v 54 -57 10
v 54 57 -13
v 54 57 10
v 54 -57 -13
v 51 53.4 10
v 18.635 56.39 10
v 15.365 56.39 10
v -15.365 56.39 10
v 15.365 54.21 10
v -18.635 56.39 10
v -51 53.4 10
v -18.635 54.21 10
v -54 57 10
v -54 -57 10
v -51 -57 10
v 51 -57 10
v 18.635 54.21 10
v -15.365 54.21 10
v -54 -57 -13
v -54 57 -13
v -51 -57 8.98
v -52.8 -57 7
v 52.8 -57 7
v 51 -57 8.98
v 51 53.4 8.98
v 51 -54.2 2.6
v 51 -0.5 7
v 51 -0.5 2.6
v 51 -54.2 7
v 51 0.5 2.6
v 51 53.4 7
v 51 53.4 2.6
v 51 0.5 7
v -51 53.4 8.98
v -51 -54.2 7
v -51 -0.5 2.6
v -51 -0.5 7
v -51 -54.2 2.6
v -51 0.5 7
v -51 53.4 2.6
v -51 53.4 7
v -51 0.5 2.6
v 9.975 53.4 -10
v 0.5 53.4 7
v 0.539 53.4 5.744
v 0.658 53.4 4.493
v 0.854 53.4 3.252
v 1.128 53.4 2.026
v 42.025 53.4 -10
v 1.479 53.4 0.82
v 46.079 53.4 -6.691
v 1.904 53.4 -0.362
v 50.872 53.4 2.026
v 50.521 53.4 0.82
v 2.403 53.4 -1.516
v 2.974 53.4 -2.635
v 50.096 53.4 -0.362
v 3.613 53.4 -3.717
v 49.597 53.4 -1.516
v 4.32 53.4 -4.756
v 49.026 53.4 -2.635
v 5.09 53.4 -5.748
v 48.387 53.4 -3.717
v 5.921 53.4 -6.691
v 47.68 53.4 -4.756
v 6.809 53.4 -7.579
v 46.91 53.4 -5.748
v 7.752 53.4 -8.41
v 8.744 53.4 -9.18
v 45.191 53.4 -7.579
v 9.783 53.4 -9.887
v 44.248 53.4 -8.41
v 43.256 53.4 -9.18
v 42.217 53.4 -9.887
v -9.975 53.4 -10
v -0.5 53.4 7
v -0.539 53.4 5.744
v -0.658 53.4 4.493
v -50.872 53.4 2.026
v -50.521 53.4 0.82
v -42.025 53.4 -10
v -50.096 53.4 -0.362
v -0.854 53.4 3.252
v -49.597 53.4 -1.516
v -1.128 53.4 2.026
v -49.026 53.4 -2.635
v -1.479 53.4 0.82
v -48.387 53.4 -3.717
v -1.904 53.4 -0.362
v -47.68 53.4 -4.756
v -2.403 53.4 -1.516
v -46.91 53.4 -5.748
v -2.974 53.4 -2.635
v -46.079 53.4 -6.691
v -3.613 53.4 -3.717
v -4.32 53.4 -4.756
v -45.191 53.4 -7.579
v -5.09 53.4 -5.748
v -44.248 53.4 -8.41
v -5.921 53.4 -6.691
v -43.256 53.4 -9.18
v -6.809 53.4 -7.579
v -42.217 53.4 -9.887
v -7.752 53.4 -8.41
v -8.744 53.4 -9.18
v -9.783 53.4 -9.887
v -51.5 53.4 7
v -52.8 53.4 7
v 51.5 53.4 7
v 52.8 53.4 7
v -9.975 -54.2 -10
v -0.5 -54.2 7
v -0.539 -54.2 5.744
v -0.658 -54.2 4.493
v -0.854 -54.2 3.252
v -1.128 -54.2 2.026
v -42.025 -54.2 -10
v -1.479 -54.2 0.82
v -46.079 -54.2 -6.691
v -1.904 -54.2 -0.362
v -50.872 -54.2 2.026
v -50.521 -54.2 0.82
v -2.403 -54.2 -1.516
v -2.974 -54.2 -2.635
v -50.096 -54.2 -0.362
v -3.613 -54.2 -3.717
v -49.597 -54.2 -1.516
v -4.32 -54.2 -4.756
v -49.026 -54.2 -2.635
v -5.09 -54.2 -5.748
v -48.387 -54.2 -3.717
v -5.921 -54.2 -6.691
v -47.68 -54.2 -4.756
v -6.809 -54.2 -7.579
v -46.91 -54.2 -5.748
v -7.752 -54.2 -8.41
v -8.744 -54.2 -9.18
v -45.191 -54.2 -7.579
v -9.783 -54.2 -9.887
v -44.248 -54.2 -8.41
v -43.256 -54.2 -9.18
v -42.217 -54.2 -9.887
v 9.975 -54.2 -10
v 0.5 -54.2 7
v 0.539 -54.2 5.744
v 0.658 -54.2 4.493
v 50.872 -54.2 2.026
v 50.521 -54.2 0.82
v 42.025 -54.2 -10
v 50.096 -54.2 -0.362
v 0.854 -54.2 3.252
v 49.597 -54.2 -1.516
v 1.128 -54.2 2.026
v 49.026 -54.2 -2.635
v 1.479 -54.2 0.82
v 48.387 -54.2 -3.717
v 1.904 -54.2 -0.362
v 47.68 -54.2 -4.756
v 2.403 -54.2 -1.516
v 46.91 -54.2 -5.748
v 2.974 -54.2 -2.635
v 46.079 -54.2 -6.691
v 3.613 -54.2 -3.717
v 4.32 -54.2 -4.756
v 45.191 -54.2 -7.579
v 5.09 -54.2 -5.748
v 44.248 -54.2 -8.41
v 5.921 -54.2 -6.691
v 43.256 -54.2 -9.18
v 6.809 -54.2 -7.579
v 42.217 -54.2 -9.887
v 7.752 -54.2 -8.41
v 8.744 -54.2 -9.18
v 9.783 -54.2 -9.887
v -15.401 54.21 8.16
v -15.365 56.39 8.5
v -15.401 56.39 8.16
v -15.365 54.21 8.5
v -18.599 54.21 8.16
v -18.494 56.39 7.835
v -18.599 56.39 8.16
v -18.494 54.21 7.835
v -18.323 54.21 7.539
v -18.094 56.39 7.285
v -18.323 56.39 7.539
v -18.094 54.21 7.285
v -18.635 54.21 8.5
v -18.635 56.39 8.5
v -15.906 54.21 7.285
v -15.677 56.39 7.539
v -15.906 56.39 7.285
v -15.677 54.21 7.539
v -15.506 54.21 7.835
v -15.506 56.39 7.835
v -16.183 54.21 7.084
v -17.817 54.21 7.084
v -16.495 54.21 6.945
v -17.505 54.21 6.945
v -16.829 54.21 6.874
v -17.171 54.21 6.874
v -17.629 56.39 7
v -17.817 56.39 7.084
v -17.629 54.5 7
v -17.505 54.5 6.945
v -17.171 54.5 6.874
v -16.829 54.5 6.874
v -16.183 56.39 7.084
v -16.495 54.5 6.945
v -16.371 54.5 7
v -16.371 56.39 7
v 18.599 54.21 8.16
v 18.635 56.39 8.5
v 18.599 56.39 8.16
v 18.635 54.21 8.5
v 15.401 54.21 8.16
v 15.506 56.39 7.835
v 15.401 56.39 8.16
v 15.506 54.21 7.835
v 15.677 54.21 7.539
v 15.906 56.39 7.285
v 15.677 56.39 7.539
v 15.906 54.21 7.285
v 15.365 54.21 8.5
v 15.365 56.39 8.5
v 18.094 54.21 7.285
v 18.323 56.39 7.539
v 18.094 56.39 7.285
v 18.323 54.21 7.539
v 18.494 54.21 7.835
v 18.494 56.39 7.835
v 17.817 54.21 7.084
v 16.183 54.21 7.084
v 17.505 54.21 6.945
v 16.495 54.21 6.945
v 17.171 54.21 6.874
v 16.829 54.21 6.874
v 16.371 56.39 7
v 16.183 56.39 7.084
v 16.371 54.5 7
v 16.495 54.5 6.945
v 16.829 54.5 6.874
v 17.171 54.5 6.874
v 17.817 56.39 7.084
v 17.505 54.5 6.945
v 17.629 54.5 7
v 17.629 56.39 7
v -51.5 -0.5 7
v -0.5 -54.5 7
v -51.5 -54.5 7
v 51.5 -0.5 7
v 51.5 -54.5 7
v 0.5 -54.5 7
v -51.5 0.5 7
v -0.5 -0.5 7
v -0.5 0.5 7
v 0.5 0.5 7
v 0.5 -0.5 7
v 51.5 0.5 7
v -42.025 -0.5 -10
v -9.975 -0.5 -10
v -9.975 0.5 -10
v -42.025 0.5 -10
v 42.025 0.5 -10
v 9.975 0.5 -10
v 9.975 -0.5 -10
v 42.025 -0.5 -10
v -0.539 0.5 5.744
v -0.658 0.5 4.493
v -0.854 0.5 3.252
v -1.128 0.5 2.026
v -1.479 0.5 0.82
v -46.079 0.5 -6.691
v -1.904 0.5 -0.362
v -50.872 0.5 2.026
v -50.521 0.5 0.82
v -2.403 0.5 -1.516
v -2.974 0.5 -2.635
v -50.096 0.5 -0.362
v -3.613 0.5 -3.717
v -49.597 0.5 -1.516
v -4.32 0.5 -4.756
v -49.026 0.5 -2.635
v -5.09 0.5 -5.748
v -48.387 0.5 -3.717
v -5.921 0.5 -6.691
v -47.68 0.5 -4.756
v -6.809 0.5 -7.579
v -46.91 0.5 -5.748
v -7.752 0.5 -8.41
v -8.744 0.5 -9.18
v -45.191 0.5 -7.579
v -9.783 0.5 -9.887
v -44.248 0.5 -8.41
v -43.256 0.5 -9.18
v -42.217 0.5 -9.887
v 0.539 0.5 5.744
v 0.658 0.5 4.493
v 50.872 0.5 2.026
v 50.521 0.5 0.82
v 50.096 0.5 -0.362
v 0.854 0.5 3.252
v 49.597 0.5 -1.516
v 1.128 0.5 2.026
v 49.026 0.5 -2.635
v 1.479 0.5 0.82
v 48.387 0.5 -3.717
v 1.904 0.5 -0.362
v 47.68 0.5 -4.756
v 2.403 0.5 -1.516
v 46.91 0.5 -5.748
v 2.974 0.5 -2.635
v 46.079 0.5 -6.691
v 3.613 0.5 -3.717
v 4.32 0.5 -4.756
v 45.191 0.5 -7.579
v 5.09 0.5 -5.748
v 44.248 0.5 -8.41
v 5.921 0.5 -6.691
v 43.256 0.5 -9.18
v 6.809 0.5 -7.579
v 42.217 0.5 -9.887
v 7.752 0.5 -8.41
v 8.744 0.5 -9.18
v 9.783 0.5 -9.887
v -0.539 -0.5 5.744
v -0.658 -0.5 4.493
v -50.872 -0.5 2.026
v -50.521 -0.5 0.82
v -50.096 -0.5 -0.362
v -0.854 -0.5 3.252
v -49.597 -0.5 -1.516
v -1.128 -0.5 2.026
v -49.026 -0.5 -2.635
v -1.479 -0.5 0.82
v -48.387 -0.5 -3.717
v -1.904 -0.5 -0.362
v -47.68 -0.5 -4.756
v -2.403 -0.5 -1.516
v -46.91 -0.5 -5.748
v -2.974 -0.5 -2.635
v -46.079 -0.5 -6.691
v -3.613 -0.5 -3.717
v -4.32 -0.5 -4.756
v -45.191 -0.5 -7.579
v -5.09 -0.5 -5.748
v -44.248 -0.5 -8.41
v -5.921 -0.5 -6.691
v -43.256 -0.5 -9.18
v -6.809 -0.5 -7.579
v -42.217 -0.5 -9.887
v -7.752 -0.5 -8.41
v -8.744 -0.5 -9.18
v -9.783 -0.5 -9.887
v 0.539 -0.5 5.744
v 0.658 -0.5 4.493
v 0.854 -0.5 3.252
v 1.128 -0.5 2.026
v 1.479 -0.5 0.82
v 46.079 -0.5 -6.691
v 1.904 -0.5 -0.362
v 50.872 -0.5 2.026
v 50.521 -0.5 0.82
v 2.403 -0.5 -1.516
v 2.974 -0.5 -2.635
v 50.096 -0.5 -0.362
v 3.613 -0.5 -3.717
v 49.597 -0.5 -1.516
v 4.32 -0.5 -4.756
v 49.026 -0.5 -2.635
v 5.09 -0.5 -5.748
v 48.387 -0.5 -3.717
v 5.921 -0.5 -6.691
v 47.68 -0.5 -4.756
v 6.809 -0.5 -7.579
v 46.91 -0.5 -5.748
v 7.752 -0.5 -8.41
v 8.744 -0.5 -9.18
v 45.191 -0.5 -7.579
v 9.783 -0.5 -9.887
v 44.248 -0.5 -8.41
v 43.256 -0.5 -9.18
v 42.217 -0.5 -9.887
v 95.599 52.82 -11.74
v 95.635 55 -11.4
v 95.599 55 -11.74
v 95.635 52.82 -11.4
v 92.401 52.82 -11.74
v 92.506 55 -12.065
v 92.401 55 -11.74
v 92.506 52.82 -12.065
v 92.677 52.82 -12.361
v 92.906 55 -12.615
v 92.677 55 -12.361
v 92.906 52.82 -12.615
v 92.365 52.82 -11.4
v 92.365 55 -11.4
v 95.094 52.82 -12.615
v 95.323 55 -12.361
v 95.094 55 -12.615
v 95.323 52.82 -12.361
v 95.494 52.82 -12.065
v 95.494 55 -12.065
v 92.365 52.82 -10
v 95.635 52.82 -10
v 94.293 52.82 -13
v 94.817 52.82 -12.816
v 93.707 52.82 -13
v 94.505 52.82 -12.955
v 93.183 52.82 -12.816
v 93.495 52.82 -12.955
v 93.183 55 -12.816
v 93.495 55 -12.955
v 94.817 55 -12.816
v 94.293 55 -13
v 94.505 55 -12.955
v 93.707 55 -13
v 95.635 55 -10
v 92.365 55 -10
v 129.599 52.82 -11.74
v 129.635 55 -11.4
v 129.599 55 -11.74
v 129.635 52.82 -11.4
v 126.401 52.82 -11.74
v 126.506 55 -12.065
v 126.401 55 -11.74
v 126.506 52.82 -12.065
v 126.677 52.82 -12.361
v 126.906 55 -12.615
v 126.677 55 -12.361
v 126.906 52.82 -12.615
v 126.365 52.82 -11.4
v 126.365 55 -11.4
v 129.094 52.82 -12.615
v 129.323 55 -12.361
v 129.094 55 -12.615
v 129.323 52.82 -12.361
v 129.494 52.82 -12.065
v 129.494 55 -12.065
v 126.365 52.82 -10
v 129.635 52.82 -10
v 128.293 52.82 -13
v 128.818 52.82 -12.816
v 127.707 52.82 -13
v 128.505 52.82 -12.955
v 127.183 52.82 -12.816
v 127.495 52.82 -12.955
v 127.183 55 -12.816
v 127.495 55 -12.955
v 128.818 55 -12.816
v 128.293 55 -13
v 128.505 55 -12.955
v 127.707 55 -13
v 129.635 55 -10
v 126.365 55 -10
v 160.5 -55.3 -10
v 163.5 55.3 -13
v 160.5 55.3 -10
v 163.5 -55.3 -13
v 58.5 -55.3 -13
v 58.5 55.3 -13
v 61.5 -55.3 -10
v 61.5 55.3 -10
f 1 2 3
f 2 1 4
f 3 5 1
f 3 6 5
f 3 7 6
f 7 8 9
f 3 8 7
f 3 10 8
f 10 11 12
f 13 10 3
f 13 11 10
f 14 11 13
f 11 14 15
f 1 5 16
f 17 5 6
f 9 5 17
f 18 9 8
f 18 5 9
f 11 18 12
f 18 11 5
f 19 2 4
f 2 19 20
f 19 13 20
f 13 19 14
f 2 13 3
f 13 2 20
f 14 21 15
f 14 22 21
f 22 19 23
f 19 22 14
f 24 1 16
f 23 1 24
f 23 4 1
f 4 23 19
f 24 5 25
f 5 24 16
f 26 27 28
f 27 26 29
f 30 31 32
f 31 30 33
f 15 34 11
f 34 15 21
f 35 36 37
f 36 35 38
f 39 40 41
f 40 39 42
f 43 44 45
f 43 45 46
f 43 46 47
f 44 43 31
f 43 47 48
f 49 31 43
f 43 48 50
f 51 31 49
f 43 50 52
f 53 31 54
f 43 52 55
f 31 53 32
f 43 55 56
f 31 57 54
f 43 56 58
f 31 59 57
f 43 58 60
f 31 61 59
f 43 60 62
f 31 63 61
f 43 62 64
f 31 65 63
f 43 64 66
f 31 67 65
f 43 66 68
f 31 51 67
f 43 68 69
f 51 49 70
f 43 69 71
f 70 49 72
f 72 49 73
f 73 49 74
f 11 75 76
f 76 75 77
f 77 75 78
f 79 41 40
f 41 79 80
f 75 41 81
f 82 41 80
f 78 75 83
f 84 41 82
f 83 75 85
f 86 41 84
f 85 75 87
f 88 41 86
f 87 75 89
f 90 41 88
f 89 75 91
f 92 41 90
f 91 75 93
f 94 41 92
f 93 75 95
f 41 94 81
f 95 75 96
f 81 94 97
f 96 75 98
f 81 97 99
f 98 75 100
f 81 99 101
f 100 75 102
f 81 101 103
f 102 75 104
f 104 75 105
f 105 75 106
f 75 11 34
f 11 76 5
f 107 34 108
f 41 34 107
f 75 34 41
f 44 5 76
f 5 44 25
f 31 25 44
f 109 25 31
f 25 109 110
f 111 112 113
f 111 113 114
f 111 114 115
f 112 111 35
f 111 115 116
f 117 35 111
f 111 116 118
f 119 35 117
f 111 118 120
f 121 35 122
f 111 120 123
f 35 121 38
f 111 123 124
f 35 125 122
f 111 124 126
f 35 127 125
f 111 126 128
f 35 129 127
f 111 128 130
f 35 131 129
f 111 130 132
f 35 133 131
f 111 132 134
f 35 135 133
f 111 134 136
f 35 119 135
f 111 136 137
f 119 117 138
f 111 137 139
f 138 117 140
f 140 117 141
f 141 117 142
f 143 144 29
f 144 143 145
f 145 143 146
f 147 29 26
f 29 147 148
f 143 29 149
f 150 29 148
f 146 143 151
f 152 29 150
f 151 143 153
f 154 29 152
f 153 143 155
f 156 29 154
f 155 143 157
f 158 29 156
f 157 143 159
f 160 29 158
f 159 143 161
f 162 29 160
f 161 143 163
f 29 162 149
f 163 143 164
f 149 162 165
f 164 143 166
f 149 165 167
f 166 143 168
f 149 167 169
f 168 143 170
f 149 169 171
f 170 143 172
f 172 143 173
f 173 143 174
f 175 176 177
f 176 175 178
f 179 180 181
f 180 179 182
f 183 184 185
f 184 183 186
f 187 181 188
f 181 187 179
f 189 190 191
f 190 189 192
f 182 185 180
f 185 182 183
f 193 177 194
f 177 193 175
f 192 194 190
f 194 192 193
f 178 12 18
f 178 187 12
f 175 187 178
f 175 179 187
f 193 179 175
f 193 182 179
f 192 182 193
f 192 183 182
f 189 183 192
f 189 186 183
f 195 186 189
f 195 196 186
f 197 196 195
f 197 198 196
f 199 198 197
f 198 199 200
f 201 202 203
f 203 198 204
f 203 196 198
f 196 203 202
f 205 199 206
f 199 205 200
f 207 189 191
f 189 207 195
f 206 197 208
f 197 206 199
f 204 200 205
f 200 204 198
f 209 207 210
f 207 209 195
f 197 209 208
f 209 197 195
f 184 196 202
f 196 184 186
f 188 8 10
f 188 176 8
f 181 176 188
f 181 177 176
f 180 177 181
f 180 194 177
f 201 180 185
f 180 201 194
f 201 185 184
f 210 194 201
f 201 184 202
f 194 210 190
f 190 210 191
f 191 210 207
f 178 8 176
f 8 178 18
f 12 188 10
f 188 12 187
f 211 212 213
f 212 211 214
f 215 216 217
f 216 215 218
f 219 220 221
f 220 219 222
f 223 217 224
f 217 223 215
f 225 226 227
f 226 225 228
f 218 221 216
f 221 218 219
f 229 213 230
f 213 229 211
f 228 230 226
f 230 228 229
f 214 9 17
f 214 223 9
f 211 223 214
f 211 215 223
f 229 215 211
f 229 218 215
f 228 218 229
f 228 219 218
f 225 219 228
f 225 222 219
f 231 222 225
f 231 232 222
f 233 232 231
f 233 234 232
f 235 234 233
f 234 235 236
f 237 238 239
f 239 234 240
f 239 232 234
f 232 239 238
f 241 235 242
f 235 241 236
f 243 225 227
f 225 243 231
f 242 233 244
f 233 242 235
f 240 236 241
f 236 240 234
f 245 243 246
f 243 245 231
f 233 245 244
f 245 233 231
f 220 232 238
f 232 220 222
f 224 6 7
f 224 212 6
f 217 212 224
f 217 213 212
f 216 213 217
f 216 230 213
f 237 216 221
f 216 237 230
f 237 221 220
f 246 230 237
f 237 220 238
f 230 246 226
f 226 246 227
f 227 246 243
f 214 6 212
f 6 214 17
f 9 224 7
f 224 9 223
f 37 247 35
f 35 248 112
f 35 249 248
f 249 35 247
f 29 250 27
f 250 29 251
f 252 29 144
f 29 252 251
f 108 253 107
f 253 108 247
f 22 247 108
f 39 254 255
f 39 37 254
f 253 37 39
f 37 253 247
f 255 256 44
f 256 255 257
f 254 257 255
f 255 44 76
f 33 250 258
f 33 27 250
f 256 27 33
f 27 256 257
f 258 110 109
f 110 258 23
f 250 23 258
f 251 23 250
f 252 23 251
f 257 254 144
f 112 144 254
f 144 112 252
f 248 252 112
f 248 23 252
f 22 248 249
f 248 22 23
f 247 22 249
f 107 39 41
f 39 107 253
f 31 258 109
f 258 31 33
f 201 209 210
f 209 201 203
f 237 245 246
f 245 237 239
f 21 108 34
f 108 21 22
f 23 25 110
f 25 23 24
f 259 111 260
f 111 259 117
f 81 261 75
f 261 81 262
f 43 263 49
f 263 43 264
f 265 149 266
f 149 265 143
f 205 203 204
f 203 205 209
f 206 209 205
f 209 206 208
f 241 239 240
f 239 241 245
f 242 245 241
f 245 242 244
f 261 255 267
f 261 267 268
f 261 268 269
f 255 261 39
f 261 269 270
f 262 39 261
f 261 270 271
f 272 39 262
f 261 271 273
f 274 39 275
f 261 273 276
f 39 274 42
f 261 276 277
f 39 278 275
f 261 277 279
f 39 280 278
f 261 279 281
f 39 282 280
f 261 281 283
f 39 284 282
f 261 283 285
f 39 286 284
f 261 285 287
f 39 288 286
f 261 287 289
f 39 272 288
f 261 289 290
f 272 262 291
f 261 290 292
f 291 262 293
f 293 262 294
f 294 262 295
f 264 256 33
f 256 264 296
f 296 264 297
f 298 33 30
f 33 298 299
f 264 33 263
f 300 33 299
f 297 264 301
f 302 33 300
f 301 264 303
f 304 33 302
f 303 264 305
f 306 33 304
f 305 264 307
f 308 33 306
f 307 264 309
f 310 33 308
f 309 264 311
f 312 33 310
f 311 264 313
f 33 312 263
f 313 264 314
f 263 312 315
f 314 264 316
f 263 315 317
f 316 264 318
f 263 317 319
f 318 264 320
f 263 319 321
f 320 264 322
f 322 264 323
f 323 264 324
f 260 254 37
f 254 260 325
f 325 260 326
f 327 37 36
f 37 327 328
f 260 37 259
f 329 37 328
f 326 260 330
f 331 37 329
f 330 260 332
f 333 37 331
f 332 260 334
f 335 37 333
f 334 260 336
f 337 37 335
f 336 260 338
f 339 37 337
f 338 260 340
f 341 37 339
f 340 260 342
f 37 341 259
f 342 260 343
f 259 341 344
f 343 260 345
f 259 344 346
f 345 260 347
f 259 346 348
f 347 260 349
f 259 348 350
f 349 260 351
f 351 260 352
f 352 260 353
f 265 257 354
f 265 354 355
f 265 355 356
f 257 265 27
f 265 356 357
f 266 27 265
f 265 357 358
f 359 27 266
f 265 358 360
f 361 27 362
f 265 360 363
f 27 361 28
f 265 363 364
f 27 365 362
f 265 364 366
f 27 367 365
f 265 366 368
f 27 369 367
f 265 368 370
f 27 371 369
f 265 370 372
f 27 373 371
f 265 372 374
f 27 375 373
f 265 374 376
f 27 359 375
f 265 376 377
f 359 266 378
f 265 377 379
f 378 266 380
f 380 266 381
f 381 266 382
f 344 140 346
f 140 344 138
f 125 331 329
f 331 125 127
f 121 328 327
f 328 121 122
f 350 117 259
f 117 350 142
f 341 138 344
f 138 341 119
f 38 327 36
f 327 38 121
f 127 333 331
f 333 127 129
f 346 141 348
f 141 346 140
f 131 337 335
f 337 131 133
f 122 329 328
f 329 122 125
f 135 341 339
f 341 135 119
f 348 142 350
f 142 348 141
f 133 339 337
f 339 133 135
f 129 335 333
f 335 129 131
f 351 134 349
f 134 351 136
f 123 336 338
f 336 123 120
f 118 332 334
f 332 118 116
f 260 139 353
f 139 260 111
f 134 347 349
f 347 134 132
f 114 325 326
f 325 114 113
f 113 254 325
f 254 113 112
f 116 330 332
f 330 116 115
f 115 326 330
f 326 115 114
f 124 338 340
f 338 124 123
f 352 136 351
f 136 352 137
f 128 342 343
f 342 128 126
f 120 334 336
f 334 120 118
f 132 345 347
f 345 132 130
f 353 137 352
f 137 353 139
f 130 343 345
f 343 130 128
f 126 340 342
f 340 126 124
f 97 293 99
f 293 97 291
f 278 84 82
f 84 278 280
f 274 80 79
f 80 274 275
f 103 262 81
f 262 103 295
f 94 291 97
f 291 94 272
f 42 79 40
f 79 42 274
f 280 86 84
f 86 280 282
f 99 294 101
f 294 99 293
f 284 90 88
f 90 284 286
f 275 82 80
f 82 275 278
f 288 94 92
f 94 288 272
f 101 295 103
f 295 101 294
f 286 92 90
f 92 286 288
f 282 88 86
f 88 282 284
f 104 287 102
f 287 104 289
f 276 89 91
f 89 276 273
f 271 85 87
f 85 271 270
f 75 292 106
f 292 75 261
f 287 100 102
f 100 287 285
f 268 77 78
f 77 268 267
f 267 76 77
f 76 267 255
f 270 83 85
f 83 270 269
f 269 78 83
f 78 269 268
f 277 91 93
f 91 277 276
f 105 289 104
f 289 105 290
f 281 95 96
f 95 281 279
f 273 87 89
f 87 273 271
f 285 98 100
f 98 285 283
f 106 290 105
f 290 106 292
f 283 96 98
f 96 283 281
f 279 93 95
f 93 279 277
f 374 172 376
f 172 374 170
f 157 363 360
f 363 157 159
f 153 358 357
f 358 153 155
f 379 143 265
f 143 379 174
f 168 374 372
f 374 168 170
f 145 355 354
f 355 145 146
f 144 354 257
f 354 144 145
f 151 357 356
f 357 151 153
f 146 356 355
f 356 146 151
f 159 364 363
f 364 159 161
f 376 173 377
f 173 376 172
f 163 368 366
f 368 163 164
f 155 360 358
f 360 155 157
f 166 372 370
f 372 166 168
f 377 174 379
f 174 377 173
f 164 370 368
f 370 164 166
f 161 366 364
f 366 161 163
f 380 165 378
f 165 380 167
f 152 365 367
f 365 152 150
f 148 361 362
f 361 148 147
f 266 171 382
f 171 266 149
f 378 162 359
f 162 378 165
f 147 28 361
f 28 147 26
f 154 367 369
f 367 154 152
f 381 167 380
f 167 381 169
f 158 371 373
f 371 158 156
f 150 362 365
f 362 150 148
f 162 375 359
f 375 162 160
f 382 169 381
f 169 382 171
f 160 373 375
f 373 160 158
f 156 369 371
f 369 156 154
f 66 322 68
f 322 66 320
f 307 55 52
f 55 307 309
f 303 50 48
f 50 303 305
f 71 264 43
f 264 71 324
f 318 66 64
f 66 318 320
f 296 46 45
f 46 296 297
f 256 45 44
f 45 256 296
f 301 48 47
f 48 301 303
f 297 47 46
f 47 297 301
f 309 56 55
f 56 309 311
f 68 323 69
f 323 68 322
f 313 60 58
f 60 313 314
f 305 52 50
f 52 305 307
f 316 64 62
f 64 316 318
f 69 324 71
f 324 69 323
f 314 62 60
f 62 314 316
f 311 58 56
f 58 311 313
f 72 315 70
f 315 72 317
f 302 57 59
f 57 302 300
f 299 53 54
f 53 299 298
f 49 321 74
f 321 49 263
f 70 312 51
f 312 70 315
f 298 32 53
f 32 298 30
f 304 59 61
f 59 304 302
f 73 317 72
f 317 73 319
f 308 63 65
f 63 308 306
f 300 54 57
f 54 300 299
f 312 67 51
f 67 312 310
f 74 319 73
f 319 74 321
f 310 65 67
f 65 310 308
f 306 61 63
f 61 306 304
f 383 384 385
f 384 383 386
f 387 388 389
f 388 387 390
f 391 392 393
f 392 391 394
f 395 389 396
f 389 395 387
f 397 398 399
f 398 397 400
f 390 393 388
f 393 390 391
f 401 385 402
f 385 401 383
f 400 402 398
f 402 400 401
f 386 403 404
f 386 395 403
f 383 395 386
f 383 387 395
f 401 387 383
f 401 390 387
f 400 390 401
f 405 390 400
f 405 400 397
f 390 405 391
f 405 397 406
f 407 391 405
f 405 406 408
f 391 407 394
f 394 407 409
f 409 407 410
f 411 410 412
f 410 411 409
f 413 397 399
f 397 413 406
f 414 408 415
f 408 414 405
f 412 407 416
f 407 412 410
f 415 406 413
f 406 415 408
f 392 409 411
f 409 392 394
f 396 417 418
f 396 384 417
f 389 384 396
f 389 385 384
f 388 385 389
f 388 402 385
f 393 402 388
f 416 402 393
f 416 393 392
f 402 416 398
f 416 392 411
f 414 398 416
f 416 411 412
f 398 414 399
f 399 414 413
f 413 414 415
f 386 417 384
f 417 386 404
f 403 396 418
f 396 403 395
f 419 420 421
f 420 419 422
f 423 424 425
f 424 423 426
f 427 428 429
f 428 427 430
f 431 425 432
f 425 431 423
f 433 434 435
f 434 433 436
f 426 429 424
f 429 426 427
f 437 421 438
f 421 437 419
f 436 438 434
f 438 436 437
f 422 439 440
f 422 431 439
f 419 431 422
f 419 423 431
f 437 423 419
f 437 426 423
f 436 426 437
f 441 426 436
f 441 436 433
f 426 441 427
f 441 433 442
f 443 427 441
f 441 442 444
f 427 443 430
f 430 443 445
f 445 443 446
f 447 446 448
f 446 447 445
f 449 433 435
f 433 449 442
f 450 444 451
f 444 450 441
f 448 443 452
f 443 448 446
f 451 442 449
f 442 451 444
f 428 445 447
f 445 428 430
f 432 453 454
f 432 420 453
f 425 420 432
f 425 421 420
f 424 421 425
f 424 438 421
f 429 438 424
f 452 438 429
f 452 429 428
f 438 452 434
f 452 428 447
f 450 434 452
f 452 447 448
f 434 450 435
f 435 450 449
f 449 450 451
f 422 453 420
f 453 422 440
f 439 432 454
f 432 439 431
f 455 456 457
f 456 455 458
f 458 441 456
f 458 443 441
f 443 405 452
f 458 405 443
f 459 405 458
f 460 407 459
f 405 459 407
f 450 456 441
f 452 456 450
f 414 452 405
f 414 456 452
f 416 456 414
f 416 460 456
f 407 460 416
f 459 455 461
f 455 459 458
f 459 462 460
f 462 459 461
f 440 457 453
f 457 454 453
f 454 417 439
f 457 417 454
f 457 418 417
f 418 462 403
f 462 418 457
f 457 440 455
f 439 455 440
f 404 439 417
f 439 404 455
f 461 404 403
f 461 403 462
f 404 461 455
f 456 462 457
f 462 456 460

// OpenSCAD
//insert_height = 20;
//insert_width = 108;
//insert_depth = 114;

include <../../box.scad>

internal_dimensions = [108, 114, 20];
box_internals = [internal_dimensions.x - wall_width*2, internal_dimensions.y - wall_width - back_wall_width, internal_dimensions.z];

module box_internals()
{
	include <coinbox_internals.scad>
}


union()
{
	box(box_internals, enable_fillet=false, enable_floor=false, num_slots = 2);
	
	translate([0,0,-wall_width])
	translate(-internal_dimensions/2)
	box_internals();
}

neighbouring_lid(box_internals, num_slots = 2, label="Money");
